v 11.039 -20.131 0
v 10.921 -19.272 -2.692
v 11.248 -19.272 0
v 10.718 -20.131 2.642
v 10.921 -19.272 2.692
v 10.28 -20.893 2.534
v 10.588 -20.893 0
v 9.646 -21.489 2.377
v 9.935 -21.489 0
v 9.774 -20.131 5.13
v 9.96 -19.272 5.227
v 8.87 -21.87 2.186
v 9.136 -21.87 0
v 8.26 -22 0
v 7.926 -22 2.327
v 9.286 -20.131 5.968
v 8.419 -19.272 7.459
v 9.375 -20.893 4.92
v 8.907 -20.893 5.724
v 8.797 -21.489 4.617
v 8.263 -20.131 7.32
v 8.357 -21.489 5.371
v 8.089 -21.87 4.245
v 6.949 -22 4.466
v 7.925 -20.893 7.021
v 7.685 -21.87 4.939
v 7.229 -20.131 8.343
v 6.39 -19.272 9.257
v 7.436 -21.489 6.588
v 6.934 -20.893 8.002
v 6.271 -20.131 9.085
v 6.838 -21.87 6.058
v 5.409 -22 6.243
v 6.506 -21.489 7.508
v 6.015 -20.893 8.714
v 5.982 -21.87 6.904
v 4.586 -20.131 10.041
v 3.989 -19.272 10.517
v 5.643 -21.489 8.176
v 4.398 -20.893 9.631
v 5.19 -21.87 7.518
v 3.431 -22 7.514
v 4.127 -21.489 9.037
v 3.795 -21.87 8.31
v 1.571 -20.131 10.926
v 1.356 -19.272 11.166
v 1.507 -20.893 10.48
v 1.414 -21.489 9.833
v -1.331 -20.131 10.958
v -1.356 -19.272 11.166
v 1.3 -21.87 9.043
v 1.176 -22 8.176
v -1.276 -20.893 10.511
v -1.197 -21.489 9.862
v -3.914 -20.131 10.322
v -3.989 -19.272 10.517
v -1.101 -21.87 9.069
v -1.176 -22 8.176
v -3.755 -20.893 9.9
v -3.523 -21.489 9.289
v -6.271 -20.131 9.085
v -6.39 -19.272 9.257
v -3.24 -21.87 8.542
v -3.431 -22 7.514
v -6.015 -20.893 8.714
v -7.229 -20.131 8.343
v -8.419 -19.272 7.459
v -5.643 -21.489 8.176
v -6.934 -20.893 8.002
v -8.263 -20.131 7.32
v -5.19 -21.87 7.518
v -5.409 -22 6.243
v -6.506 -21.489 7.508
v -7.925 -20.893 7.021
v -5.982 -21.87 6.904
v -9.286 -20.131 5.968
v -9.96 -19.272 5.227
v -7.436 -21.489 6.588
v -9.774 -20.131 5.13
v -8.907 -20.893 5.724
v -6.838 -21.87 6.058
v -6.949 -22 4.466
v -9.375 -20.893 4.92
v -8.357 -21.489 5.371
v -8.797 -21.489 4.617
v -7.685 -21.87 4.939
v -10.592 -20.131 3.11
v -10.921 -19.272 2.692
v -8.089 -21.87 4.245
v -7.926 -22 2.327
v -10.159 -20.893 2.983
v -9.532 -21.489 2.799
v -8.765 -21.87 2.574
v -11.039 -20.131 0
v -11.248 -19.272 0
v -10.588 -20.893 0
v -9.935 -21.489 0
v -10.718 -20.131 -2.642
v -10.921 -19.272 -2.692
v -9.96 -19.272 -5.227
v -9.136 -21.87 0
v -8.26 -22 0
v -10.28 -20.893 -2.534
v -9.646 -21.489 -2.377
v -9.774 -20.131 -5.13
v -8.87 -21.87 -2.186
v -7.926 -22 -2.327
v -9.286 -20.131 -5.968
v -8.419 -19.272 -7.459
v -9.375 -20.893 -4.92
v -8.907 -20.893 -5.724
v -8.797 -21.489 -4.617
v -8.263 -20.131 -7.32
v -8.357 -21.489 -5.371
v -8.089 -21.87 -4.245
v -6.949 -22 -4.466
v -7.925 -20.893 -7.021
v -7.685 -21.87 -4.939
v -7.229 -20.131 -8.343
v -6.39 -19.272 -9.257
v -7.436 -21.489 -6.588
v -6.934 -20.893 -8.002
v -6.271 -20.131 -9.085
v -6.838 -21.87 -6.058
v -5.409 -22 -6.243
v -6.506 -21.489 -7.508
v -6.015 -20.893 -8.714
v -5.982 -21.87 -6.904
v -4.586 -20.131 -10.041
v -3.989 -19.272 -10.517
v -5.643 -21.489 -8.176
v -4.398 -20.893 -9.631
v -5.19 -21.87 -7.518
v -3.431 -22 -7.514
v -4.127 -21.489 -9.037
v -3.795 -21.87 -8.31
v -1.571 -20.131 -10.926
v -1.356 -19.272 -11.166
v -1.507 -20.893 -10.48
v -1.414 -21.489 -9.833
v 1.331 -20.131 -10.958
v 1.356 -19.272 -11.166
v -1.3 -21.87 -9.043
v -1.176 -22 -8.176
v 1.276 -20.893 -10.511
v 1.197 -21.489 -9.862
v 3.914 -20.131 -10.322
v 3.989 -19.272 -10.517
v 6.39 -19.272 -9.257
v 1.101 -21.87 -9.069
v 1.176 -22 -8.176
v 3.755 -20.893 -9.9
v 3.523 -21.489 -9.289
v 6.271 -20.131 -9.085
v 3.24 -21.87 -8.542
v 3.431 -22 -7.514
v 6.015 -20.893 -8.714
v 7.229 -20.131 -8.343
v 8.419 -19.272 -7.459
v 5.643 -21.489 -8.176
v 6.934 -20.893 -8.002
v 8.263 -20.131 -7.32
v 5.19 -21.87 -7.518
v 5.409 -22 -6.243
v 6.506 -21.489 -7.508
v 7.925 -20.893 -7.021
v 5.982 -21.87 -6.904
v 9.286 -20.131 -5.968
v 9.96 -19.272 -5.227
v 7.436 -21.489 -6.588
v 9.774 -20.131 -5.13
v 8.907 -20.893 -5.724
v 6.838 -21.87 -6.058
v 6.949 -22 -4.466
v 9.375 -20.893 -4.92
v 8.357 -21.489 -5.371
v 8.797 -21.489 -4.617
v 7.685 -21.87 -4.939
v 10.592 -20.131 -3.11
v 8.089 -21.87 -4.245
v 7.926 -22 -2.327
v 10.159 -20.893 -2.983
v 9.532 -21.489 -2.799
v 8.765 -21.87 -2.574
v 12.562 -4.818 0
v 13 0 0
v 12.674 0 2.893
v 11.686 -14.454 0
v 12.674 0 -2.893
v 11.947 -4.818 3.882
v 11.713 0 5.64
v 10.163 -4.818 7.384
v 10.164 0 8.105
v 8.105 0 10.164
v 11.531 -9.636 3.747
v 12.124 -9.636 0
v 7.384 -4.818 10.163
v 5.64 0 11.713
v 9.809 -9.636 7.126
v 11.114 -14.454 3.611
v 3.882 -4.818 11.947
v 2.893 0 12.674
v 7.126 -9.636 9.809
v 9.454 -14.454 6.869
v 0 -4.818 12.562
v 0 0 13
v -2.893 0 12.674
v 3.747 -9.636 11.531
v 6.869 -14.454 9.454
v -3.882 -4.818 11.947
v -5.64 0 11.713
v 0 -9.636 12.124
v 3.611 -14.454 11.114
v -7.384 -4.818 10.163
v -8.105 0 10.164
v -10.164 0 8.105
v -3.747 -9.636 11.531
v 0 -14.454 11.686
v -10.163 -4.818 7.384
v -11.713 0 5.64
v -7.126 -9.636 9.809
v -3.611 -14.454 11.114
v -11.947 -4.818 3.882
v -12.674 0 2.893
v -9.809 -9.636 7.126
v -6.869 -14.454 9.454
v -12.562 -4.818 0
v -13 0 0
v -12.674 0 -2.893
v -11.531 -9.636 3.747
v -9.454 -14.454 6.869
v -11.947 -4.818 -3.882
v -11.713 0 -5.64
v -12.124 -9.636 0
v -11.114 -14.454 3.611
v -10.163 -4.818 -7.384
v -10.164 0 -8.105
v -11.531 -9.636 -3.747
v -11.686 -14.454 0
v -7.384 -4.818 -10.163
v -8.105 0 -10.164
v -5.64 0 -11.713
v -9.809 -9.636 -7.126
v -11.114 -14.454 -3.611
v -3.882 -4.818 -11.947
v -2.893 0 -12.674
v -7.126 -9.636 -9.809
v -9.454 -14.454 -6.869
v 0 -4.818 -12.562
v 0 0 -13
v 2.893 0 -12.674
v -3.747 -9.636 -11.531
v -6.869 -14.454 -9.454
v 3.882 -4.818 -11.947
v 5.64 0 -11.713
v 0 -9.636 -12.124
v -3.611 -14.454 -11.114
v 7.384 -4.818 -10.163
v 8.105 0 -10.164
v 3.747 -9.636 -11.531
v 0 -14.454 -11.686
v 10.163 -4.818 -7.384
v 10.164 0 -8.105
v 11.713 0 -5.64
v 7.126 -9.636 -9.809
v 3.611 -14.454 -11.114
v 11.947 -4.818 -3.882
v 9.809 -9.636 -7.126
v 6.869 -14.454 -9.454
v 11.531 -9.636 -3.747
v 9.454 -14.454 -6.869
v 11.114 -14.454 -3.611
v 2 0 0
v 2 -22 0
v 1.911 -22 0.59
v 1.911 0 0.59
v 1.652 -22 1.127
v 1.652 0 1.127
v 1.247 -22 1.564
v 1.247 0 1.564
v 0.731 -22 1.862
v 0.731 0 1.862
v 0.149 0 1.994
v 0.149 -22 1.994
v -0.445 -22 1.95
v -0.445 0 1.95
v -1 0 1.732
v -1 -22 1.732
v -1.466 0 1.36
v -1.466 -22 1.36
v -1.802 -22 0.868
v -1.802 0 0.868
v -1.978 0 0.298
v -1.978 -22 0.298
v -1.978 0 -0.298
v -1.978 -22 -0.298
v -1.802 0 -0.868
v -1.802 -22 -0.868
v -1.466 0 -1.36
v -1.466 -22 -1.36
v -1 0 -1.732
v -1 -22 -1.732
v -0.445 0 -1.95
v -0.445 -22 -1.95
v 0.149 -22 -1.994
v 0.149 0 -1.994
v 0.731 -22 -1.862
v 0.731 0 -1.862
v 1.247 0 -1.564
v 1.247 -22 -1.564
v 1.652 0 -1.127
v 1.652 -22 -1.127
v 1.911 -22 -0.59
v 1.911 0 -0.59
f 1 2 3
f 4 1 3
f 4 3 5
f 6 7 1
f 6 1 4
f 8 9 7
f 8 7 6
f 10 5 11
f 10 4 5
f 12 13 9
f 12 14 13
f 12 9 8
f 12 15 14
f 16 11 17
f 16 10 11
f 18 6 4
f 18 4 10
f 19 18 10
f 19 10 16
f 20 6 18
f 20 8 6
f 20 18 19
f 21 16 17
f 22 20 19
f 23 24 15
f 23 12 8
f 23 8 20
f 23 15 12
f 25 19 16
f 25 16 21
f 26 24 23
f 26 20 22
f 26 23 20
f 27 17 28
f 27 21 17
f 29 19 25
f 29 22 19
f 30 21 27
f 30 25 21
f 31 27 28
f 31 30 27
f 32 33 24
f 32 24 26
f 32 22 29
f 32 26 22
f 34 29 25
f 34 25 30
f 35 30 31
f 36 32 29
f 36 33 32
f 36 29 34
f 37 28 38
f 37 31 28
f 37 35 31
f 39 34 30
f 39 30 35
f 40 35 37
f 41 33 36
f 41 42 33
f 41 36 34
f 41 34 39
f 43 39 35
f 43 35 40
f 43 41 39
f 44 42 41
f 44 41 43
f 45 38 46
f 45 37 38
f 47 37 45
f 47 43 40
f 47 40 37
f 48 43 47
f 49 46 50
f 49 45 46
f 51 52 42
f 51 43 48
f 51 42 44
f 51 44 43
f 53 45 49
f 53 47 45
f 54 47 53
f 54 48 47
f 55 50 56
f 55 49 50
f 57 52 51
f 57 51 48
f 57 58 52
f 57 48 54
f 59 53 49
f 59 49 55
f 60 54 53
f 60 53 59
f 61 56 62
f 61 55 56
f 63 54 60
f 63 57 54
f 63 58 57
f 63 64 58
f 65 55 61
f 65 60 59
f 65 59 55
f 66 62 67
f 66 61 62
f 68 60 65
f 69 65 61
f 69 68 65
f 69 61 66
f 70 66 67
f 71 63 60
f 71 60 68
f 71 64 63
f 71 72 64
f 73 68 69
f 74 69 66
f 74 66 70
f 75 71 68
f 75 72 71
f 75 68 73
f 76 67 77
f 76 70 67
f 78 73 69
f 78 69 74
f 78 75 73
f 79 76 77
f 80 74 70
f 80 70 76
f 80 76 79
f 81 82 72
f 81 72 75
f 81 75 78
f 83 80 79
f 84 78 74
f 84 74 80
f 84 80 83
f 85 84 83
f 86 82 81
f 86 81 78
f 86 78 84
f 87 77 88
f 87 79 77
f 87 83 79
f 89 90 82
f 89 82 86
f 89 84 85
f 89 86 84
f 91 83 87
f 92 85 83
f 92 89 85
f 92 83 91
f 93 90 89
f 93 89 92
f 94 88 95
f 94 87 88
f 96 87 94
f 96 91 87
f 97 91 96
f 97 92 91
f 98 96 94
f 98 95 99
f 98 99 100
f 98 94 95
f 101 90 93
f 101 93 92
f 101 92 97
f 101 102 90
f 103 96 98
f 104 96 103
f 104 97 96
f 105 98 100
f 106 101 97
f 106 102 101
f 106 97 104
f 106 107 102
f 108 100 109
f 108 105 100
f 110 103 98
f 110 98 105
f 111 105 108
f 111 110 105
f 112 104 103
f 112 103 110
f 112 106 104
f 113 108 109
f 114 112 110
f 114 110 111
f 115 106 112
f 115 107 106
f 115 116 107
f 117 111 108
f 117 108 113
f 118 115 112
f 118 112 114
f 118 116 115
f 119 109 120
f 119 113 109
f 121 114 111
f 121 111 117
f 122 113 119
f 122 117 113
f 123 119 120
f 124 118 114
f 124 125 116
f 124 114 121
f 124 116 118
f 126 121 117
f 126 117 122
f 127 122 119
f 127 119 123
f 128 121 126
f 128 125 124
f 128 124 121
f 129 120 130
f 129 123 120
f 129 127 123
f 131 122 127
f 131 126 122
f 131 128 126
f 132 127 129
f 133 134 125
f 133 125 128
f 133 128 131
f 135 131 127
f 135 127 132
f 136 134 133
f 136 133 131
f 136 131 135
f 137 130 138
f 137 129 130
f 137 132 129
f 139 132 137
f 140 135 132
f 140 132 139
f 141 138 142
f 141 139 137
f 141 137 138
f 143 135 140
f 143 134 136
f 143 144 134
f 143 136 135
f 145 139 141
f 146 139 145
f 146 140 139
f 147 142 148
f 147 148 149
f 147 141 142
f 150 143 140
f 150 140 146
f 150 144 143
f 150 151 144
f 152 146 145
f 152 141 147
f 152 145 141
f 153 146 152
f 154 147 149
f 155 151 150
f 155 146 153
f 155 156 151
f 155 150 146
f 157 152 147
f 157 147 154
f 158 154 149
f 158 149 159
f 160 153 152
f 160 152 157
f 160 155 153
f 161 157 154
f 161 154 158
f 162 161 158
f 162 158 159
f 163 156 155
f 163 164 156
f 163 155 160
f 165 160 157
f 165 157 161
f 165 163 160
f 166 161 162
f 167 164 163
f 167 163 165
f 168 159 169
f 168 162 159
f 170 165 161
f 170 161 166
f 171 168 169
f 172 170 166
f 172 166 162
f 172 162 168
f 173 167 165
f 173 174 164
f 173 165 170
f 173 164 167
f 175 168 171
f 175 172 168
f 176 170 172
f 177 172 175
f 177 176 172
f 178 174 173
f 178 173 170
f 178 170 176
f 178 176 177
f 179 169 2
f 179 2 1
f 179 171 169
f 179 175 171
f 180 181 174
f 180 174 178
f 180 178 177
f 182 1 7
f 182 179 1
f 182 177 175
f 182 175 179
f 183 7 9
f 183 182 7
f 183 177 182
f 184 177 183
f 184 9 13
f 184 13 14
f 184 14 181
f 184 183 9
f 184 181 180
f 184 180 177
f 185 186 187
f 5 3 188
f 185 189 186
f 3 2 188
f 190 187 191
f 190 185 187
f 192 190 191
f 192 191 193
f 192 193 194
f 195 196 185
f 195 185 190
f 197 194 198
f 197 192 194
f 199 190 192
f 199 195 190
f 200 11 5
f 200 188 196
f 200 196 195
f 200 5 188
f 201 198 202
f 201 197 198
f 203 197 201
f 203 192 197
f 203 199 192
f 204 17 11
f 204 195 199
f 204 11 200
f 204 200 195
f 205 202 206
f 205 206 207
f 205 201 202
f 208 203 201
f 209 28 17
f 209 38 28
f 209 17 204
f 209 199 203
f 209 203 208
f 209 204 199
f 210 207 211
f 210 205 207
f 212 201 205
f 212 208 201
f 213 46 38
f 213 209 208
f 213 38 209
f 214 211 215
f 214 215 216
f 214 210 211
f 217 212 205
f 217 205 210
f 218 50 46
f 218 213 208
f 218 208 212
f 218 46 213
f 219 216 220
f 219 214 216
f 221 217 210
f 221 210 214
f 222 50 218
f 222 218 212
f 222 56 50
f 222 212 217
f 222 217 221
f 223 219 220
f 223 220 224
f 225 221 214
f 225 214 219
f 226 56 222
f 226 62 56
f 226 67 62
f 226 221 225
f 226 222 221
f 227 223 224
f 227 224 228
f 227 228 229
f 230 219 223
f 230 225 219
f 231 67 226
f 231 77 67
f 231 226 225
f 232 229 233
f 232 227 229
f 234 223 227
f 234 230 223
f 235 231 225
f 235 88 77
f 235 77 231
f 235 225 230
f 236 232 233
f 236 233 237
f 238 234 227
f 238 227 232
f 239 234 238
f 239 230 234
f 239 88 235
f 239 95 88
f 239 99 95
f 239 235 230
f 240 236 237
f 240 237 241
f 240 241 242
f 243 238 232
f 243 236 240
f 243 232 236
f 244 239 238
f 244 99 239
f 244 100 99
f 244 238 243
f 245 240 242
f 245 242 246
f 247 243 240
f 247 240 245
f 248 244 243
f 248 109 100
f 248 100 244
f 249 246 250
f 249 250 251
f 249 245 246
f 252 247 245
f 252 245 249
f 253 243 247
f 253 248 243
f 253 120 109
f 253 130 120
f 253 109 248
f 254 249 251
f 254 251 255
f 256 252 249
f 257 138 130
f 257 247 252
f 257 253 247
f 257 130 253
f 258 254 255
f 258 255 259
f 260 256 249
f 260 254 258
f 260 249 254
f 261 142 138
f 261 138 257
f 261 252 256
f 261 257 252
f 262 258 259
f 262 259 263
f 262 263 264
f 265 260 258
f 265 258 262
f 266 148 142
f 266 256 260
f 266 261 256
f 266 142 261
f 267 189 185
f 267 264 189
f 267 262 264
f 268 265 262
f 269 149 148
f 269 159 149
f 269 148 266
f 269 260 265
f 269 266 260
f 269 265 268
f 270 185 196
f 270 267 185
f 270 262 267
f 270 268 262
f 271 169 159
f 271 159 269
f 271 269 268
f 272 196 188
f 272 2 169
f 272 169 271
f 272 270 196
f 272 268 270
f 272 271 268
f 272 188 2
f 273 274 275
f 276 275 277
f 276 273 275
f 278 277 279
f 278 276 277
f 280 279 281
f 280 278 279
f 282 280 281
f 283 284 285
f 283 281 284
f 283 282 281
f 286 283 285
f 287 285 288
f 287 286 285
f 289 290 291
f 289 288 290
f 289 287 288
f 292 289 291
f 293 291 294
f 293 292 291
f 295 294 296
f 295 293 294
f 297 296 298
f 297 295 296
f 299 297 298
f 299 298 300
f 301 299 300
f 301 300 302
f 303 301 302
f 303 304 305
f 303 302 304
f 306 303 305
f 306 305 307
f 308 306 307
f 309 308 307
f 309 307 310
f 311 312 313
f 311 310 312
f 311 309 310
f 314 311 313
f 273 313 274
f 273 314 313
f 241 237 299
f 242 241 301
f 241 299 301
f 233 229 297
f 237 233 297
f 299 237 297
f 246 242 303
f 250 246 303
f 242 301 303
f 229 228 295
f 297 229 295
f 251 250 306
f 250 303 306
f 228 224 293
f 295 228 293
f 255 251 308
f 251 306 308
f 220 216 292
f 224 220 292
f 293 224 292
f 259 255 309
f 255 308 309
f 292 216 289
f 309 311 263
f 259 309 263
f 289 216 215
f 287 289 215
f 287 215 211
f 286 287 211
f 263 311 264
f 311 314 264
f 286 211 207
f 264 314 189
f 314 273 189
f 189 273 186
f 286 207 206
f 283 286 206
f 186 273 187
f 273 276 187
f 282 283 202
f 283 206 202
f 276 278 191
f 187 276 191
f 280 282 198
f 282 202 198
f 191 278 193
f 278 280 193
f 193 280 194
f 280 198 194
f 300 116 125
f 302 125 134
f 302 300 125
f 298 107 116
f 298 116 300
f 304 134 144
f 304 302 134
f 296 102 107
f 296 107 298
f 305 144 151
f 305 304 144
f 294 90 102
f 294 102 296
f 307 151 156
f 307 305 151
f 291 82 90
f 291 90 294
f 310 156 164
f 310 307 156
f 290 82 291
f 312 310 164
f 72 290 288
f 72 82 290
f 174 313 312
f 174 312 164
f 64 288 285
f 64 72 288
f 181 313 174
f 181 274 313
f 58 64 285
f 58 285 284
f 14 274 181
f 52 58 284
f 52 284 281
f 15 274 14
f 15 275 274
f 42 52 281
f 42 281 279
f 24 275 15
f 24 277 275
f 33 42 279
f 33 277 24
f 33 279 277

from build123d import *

# Parameters (mm, degrees)
F0_R     = 13
F2_R     = 11
F4_R     = 3
F5_R     = 2
F6_DEPTH = 22.001


with BuildPart() as f3:
    # F0 (on Front) → F3 section 0
    with BuildSketch(Plane.XZ):
        Circle(F0_R)
    # F2 (on offset) → F3 section 1
    with BuildSketch(Plane.XZ.offset(22)):
        Circle(F2_R)
    loft()

    # F4
    f4_edges = [f3.edges().sort_by_distance(p)[0] for p in [
        (-11, -22, 0),
    ]]
    fillet(f4_edges, radius=F4_R)

    # F5 (on Front) → F6 (cut, through all)
    with BuildSketch(Plane.XZ):
        Circle(F5_R)
    extrude(amount=F6_DEPTH, mode=Mode.SUBTRACT)


solid = f3.part
